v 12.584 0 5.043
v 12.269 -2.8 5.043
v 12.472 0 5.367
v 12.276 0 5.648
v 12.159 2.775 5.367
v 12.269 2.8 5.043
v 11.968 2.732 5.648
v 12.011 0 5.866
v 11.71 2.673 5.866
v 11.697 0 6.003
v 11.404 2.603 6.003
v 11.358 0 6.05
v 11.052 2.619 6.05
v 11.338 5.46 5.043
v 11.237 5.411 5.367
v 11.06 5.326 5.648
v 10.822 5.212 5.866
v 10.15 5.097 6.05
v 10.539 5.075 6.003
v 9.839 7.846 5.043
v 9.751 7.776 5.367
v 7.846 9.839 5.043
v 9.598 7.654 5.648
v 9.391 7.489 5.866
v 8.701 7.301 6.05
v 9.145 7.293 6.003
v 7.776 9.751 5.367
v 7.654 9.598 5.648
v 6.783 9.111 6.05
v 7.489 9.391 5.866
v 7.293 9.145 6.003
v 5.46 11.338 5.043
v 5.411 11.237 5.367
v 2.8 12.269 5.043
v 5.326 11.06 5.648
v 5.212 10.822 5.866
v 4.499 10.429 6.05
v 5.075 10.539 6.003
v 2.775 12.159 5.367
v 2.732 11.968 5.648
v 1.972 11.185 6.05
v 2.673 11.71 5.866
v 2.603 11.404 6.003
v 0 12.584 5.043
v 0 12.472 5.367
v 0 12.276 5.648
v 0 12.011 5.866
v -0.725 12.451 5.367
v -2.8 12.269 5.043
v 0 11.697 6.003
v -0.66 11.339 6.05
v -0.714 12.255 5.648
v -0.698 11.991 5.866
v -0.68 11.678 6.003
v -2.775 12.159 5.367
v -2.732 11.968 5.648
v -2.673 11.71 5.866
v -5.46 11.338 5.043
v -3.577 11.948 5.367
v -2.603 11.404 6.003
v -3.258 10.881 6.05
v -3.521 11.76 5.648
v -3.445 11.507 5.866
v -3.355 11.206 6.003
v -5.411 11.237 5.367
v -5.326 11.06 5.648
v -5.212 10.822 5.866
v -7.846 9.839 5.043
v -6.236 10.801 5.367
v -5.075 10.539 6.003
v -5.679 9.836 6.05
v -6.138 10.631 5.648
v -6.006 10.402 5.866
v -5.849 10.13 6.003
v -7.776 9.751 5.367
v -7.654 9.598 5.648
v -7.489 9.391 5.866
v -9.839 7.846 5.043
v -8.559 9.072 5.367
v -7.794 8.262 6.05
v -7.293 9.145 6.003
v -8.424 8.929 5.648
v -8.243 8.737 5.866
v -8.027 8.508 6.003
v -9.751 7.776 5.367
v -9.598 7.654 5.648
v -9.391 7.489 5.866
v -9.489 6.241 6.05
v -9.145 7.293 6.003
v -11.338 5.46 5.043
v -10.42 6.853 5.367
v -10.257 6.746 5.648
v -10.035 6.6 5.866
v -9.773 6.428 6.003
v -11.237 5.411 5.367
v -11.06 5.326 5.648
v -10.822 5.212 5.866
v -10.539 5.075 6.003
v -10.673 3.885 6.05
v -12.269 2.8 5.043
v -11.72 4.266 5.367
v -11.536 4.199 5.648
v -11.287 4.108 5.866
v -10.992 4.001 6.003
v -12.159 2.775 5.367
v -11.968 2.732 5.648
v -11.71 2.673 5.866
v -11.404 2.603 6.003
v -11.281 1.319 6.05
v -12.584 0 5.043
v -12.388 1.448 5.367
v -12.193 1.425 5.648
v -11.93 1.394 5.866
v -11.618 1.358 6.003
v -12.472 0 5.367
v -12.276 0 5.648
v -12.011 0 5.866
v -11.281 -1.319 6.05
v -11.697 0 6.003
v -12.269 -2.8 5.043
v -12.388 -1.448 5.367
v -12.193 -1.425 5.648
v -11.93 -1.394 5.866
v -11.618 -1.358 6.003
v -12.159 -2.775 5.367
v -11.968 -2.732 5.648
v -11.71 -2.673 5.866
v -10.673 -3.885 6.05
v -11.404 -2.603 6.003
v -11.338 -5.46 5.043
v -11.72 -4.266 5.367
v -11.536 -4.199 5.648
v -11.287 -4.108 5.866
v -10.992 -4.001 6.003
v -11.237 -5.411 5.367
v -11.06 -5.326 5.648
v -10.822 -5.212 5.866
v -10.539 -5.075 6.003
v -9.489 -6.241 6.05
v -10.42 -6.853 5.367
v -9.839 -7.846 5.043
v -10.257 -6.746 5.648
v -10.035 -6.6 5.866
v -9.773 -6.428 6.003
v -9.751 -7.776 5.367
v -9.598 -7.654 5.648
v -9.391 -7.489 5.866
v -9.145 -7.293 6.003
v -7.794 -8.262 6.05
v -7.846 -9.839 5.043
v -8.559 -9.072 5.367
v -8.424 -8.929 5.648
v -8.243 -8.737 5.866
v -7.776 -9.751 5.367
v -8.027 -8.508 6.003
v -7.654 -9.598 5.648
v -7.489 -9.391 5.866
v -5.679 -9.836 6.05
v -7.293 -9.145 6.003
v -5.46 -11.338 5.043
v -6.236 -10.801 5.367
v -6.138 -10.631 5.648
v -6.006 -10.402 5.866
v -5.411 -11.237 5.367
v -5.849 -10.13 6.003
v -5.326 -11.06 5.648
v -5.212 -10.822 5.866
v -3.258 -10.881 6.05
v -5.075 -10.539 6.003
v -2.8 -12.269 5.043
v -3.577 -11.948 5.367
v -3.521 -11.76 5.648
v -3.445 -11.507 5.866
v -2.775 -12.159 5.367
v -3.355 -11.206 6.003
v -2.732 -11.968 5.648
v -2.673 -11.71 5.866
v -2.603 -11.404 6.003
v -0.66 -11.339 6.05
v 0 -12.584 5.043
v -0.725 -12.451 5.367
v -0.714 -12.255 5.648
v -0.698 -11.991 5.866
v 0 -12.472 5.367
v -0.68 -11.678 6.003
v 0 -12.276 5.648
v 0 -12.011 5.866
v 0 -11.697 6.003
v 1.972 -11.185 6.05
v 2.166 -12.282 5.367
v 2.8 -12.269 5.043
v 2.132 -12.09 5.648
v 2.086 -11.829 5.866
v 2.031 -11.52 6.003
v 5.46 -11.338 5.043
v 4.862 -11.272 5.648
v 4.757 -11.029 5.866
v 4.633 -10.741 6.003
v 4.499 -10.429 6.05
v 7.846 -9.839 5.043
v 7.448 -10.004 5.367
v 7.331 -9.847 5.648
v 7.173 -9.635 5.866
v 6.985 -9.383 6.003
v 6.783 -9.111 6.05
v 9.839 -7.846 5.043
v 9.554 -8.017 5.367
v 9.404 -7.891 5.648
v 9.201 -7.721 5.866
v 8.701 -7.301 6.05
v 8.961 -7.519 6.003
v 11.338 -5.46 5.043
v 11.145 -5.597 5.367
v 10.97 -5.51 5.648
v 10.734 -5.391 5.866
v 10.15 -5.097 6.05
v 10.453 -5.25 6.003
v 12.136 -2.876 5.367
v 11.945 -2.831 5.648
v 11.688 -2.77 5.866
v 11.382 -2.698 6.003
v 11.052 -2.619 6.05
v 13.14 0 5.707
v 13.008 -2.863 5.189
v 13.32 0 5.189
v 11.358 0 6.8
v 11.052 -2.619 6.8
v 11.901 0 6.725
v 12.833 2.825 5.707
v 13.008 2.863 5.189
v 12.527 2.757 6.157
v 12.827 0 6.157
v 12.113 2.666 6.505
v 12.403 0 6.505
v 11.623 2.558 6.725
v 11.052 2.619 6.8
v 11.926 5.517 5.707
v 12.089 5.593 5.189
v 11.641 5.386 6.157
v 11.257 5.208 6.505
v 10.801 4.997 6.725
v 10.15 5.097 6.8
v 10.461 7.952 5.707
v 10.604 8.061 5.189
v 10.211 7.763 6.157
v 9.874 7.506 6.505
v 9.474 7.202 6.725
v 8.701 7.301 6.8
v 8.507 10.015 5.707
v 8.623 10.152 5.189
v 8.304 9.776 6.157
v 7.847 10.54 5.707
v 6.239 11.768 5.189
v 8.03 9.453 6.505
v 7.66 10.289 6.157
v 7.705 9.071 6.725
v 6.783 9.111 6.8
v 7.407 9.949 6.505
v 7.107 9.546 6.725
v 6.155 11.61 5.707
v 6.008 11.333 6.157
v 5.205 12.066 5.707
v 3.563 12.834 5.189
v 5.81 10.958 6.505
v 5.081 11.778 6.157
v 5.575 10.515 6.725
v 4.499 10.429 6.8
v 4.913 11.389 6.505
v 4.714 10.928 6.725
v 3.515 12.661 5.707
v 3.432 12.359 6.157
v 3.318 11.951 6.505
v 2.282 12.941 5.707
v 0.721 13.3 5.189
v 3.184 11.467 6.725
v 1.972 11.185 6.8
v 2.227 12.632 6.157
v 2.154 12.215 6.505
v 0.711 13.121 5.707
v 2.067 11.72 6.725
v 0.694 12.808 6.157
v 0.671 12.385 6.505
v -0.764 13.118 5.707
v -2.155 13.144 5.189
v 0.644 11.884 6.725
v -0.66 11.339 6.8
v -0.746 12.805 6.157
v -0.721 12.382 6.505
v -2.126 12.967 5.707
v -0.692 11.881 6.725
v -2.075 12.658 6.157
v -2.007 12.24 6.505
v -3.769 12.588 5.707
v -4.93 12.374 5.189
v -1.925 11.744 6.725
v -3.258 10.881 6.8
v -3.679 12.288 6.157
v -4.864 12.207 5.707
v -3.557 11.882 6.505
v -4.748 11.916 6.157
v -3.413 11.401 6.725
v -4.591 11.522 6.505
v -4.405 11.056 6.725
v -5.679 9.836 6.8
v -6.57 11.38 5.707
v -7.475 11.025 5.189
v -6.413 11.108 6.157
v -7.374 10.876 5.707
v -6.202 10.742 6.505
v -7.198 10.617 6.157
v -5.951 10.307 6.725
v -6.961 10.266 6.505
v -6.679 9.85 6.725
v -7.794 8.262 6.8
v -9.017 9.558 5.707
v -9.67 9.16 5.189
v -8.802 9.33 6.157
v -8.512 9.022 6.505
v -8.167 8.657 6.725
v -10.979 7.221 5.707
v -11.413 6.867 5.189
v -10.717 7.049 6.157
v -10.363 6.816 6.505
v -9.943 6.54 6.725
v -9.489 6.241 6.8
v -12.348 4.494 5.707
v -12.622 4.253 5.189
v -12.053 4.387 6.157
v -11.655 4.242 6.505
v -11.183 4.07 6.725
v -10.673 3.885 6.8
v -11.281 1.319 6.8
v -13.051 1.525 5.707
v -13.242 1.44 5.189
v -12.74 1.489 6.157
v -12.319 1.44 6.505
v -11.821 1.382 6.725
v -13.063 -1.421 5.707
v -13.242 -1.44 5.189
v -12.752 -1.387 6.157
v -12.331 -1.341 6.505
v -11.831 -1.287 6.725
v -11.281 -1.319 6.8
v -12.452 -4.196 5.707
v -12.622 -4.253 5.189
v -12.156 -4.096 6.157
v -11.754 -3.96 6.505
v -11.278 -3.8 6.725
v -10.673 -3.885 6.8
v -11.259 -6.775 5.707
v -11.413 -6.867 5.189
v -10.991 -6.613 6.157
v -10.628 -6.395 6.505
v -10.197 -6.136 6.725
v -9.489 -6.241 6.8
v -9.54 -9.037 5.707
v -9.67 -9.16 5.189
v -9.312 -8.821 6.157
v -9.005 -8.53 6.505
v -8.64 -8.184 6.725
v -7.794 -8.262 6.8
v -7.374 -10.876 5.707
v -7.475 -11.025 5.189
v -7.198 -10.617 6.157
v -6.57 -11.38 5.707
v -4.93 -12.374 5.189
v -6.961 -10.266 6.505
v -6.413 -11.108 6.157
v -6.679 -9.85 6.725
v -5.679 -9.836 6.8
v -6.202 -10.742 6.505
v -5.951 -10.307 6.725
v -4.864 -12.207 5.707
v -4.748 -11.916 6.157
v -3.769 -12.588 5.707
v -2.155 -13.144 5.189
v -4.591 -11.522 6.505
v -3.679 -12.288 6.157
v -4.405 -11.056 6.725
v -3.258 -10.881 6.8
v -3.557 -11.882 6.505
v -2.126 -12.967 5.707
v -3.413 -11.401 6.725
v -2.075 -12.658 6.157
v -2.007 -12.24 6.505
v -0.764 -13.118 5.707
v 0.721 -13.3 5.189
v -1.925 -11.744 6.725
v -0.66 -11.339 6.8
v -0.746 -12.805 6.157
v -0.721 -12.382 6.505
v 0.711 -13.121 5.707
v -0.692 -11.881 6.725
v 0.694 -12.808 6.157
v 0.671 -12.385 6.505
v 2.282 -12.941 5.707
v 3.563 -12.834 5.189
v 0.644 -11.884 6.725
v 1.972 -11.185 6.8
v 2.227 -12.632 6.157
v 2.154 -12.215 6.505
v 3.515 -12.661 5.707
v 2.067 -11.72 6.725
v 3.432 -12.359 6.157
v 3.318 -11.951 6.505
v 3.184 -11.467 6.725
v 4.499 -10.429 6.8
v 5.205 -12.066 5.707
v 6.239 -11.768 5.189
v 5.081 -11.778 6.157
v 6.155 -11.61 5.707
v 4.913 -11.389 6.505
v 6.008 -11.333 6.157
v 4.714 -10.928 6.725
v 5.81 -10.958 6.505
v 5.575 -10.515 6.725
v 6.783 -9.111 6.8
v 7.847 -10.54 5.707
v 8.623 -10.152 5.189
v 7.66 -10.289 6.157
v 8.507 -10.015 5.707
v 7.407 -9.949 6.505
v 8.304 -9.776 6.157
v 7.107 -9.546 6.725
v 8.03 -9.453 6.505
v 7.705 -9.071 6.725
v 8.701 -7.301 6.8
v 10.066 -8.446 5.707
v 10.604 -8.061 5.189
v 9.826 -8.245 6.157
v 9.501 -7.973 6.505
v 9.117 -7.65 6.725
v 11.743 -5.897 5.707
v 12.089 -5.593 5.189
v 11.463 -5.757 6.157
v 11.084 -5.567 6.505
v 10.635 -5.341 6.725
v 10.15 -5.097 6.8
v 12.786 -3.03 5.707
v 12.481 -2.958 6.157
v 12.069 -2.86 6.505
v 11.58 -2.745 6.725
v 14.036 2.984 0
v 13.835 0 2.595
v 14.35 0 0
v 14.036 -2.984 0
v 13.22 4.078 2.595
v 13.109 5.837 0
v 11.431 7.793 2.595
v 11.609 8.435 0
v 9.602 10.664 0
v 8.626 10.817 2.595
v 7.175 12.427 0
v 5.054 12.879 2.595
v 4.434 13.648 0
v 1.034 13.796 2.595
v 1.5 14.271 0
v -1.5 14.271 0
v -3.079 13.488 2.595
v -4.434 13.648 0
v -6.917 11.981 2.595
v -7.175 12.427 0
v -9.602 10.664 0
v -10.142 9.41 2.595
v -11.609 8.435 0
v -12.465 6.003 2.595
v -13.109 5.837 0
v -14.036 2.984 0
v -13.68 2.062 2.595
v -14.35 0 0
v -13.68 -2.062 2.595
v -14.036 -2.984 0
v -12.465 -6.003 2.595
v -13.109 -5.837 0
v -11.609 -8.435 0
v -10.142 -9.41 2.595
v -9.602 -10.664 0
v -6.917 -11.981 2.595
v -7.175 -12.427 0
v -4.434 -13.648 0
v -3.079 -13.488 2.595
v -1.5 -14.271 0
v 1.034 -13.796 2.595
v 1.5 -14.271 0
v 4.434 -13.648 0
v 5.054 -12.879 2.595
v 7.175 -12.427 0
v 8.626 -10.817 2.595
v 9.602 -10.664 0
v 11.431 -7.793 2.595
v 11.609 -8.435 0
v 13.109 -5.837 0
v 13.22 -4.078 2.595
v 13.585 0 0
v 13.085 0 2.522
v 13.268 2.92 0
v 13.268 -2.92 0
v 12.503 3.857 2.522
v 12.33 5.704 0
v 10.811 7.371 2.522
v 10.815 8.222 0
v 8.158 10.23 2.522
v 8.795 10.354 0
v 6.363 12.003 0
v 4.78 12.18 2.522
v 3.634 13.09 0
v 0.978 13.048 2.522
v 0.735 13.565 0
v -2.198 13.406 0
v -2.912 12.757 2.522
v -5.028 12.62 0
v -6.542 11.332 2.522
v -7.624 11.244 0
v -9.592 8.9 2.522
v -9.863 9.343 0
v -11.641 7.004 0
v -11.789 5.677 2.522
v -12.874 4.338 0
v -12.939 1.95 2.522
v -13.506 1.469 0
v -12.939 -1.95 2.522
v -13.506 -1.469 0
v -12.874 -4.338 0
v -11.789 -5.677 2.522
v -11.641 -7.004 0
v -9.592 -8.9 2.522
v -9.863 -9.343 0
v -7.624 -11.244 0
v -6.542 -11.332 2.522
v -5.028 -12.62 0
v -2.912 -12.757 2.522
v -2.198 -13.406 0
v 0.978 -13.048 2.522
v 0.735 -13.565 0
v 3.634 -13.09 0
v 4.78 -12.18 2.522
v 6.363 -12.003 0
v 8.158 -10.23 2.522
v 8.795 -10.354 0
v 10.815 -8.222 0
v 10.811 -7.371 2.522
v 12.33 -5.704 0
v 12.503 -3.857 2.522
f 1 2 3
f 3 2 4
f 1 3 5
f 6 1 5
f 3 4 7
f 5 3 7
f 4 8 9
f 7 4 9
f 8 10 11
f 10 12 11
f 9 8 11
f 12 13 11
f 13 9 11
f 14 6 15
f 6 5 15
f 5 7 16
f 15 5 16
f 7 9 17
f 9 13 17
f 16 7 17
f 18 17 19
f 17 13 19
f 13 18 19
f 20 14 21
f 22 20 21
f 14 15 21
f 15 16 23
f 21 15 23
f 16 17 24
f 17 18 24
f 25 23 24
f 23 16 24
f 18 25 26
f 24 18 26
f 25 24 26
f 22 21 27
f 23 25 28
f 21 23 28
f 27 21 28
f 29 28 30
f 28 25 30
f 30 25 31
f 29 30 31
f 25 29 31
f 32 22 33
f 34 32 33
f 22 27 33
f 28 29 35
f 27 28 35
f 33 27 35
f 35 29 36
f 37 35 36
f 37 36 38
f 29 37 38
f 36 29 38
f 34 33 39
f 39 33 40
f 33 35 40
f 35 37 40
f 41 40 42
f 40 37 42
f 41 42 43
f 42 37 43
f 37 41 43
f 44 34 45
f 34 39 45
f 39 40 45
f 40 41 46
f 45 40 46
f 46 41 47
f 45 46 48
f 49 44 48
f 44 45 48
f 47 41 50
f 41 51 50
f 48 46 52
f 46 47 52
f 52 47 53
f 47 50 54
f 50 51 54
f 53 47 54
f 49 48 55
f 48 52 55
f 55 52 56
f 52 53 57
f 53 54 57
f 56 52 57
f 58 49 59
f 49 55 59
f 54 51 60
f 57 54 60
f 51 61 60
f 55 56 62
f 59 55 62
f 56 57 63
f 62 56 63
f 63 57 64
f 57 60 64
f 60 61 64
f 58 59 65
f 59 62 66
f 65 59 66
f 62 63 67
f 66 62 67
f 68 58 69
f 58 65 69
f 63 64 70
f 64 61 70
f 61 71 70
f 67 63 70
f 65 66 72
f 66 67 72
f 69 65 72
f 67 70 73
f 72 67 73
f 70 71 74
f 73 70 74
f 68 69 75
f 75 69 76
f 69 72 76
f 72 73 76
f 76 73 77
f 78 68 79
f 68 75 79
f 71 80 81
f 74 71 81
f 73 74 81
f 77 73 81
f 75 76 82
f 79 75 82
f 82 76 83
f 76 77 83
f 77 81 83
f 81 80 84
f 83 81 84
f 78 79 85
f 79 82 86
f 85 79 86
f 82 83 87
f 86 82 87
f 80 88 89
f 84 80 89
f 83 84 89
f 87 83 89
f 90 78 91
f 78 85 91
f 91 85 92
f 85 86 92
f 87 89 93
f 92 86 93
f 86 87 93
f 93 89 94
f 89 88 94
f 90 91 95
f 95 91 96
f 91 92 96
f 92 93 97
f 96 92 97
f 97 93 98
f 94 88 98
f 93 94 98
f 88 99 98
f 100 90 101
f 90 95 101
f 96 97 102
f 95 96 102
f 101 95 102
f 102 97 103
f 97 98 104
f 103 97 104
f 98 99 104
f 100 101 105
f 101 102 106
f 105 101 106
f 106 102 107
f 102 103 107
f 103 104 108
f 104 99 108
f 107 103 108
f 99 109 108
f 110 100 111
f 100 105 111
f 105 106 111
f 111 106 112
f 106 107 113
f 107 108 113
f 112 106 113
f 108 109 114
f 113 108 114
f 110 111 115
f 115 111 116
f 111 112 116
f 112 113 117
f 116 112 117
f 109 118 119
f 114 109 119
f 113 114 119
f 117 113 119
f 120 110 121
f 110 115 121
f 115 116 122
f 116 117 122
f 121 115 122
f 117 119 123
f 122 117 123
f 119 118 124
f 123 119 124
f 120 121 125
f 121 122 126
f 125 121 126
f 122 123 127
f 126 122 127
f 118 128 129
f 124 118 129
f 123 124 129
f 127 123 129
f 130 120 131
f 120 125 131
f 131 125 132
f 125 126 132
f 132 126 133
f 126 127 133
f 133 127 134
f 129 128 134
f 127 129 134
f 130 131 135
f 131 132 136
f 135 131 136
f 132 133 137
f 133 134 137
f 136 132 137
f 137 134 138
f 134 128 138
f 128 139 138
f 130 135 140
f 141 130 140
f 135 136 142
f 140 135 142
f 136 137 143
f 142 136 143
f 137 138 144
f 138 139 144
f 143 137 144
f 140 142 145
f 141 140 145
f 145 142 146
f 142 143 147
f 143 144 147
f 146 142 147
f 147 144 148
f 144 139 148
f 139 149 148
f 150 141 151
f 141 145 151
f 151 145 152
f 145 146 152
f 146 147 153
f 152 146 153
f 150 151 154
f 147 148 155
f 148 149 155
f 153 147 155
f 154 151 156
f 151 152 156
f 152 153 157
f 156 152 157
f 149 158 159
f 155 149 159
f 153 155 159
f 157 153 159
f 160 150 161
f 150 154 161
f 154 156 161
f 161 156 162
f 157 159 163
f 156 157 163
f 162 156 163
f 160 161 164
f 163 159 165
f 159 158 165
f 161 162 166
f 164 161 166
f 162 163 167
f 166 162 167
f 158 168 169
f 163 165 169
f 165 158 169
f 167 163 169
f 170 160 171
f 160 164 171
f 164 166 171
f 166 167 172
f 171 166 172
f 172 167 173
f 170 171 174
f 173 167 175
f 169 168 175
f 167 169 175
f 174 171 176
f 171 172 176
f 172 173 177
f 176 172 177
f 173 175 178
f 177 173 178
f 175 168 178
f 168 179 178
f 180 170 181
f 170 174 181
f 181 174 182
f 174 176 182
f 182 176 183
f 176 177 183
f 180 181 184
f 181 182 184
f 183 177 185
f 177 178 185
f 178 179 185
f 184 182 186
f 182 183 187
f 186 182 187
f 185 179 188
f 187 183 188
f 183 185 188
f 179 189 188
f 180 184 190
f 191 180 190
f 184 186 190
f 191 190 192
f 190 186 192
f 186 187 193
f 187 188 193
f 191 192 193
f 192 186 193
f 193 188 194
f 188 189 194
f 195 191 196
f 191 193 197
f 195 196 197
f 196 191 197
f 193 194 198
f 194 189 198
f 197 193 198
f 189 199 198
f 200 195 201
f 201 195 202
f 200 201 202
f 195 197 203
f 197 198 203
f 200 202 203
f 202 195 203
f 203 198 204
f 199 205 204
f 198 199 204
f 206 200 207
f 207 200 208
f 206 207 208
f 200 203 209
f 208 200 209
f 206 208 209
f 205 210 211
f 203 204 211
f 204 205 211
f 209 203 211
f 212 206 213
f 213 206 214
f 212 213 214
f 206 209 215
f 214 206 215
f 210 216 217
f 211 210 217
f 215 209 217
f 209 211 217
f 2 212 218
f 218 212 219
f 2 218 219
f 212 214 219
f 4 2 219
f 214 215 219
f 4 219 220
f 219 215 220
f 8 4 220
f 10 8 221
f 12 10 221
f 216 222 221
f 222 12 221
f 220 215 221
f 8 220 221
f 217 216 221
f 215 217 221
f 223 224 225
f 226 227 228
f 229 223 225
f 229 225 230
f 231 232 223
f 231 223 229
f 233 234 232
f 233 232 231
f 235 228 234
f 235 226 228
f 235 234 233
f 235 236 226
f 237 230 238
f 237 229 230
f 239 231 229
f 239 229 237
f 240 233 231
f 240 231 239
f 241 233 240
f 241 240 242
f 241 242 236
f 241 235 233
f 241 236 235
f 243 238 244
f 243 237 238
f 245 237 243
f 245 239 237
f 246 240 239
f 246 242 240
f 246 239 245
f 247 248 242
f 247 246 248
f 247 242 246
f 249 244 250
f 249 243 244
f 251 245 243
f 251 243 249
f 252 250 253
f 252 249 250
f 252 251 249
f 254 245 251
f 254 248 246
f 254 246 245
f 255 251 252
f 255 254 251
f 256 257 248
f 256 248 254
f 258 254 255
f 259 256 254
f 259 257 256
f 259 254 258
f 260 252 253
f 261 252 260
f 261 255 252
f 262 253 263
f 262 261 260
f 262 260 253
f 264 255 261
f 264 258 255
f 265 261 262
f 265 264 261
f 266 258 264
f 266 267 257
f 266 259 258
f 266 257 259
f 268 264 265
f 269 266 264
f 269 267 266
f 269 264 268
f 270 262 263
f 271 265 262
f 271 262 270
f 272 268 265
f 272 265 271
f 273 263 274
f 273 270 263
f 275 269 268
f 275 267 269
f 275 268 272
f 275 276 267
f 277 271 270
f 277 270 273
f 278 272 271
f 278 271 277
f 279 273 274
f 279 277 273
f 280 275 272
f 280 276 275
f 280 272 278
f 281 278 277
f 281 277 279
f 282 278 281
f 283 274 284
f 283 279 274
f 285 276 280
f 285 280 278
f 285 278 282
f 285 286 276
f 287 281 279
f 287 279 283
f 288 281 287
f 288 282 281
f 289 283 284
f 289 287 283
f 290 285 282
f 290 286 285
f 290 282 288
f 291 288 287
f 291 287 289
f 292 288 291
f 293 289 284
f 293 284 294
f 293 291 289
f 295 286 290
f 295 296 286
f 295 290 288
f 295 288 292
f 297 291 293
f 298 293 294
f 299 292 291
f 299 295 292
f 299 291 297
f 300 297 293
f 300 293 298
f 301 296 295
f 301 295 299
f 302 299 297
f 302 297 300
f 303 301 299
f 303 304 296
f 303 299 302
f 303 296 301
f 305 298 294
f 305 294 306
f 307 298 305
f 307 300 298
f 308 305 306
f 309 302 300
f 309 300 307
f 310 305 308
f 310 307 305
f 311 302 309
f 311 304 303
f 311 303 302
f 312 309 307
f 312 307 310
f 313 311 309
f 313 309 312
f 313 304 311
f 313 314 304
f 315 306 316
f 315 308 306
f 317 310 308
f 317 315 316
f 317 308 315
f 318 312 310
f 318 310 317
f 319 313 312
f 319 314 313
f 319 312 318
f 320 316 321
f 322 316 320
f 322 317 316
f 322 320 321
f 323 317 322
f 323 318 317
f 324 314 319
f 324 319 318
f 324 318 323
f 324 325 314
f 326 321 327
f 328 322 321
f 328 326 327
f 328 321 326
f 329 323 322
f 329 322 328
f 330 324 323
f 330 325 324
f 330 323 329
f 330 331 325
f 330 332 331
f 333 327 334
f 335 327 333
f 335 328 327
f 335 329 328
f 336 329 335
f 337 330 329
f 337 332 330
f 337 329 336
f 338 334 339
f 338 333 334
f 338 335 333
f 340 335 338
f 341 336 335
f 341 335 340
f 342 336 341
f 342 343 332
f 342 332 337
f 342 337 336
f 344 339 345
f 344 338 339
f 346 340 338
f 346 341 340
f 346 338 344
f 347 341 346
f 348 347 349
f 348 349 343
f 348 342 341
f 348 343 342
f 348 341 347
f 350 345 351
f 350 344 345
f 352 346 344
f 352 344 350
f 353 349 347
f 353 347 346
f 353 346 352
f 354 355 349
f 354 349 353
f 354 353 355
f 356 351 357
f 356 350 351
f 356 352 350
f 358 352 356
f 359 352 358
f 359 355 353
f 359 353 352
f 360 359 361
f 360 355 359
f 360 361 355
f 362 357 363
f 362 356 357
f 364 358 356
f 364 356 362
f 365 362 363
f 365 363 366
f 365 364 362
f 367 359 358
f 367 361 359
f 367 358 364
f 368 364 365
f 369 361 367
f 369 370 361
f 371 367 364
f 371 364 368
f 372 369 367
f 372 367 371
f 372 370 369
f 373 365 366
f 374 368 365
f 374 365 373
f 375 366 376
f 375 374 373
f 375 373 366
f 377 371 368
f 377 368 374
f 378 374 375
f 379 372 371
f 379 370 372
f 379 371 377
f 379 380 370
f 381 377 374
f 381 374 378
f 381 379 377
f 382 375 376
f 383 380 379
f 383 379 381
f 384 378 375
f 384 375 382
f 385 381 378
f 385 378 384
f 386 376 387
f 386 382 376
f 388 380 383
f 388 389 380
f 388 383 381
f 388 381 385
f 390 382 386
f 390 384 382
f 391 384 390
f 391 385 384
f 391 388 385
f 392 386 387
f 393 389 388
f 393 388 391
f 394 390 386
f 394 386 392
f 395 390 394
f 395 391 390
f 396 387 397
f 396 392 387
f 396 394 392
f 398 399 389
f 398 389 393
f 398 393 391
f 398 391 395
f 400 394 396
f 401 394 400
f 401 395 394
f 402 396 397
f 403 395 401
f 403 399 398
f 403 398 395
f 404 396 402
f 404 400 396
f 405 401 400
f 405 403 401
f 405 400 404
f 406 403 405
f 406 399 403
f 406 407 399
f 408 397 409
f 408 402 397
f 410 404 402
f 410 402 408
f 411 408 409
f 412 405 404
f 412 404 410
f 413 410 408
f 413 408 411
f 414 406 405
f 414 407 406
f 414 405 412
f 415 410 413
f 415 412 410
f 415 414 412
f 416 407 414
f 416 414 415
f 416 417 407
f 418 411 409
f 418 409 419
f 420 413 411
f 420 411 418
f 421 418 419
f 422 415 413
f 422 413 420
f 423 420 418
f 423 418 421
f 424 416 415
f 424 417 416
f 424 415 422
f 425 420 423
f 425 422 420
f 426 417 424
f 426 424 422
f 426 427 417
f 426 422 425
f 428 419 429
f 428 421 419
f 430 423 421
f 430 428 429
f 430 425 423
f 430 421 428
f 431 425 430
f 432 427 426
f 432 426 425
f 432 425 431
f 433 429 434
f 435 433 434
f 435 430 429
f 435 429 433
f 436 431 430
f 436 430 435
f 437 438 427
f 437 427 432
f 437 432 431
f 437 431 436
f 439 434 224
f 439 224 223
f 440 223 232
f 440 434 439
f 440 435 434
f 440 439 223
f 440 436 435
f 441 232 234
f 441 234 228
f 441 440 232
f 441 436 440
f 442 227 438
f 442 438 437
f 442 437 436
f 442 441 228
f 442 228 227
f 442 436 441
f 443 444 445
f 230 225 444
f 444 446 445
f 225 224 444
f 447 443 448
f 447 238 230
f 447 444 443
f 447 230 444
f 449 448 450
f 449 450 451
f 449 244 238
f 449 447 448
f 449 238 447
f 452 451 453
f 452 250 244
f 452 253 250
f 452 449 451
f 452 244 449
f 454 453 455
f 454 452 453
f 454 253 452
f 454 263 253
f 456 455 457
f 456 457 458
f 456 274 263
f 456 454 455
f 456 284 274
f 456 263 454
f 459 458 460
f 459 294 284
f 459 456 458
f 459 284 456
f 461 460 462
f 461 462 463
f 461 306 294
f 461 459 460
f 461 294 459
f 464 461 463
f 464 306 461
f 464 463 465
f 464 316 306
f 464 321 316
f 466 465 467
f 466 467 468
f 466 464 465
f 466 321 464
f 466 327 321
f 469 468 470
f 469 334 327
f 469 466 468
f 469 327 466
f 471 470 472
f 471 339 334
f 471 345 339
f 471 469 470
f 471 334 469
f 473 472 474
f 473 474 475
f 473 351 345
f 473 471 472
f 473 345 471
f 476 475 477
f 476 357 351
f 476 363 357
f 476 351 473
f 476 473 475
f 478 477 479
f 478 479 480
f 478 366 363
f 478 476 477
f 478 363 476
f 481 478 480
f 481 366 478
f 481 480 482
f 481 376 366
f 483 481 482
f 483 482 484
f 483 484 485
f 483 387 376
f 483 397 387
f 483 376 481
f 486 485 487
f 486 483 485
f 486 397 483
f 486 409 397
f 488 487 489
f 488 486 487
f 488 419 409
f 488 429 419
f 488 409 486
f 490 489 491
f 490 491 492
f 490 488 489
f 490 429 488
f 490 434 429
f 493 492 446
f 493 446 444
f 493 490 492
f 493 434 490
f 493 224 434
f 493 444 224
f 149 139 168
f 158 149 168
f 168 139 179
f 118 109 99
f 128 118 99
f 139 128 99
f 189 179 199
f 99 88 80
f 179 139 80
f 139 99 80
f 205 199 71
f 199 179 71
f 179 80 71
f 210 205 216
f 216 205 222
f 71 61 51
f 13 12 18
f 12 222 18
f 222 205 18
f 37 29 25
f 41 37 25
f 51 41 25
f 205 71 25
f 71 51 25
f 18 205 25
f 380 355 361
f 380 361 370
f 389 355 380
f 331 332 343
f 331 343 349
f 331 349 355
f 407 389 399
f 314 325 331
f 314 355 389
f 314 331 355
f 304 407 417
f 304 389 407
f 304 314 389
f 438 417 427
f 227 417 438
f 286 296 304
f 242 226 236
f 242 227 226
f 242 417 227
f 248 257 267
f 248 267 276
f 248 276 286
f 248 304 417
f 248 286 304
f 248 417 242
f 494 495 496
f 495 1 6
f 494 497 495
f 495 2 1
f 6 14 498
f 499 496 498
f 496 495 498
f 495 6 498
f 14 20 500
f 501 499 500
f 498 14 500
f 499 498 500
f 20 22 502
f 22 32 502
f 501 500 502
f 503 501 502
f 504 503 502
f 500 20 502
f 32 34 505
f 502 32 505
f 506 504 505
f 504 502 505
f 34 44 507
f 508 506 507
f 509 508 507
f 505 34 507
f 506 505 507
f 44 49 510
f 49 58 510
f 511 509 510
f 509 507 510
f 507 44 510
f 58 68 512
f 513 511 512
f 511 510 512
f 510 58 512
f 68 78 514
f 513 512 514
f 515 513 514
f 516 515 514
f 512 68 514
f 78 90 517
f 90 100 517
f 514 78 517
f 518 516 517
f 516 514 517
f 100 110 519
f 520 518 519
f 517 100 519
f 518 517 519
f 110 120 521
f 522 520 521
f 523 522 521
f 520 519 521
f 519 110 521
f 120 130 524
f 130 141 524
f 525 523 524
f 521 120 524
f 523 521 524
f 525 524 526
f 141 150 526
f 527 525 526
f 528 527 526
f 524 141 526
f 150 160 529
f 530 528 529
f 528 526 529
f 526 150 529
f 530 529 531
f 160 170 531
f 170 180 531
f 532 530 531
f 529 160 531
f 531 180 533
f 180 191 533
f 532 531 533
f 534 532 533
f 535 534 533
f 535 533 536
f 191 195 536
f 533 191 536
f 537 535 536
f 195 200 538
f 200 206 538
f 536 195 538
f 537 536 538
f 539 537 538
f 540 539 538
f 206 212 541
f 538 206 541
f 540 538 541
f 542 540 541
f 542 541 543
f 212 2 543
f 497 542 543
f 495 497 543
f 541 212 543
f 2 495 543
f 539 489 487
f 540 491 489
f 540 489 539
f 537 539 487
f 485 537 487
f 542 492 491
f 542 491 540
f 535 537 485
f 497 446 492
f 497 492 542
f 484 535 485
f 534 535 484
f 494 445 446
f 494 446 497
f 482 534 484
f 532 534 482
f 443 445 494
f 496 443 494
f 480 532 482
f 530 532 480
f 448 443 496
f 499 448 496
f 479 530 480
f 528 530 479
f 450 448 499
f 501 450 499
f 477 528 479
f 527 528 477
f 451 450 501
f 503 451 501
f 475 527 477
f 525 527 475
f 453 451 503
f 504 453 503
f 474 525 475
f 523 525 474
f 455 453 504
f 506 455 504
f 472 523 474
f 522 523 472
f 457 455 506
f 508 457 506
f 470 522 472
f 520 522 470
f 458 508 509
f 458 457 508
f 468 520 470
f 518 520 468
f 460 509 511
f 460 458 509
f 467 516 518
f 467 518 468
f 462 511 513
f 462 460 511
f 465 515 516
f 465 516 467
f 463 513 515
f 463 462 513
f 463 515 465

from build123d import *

# Parameters (mm, degrees)
F2_R = 2
F3_T = -0.75


with BuildPart() as f1:
    # F0 (on Front) → F1 (revolve)
    with BuildSketch(Plane.XZ):
        Polygon((0, 6.8), (0, 0), (14.35, 0), (13, 6.8), align=None)
    revolve(axis=Axis((0, 0, 3.4), (0, 0, 1)))

    # F2
    f2_edges = [f1.edges().sort_by_distance(p)[0] for p in [
        (-13, 0, 6.8),
    ]]
    fillet(f2_edges, radius=F2_R)

    # F3
    f3_openings = [f1.faces().sort_by_distance(p)[0] for p in [
        (0, 0, 0),
    ]]
    offset(amount=F3_T, openings=f3_openings)


solid = f1.part
